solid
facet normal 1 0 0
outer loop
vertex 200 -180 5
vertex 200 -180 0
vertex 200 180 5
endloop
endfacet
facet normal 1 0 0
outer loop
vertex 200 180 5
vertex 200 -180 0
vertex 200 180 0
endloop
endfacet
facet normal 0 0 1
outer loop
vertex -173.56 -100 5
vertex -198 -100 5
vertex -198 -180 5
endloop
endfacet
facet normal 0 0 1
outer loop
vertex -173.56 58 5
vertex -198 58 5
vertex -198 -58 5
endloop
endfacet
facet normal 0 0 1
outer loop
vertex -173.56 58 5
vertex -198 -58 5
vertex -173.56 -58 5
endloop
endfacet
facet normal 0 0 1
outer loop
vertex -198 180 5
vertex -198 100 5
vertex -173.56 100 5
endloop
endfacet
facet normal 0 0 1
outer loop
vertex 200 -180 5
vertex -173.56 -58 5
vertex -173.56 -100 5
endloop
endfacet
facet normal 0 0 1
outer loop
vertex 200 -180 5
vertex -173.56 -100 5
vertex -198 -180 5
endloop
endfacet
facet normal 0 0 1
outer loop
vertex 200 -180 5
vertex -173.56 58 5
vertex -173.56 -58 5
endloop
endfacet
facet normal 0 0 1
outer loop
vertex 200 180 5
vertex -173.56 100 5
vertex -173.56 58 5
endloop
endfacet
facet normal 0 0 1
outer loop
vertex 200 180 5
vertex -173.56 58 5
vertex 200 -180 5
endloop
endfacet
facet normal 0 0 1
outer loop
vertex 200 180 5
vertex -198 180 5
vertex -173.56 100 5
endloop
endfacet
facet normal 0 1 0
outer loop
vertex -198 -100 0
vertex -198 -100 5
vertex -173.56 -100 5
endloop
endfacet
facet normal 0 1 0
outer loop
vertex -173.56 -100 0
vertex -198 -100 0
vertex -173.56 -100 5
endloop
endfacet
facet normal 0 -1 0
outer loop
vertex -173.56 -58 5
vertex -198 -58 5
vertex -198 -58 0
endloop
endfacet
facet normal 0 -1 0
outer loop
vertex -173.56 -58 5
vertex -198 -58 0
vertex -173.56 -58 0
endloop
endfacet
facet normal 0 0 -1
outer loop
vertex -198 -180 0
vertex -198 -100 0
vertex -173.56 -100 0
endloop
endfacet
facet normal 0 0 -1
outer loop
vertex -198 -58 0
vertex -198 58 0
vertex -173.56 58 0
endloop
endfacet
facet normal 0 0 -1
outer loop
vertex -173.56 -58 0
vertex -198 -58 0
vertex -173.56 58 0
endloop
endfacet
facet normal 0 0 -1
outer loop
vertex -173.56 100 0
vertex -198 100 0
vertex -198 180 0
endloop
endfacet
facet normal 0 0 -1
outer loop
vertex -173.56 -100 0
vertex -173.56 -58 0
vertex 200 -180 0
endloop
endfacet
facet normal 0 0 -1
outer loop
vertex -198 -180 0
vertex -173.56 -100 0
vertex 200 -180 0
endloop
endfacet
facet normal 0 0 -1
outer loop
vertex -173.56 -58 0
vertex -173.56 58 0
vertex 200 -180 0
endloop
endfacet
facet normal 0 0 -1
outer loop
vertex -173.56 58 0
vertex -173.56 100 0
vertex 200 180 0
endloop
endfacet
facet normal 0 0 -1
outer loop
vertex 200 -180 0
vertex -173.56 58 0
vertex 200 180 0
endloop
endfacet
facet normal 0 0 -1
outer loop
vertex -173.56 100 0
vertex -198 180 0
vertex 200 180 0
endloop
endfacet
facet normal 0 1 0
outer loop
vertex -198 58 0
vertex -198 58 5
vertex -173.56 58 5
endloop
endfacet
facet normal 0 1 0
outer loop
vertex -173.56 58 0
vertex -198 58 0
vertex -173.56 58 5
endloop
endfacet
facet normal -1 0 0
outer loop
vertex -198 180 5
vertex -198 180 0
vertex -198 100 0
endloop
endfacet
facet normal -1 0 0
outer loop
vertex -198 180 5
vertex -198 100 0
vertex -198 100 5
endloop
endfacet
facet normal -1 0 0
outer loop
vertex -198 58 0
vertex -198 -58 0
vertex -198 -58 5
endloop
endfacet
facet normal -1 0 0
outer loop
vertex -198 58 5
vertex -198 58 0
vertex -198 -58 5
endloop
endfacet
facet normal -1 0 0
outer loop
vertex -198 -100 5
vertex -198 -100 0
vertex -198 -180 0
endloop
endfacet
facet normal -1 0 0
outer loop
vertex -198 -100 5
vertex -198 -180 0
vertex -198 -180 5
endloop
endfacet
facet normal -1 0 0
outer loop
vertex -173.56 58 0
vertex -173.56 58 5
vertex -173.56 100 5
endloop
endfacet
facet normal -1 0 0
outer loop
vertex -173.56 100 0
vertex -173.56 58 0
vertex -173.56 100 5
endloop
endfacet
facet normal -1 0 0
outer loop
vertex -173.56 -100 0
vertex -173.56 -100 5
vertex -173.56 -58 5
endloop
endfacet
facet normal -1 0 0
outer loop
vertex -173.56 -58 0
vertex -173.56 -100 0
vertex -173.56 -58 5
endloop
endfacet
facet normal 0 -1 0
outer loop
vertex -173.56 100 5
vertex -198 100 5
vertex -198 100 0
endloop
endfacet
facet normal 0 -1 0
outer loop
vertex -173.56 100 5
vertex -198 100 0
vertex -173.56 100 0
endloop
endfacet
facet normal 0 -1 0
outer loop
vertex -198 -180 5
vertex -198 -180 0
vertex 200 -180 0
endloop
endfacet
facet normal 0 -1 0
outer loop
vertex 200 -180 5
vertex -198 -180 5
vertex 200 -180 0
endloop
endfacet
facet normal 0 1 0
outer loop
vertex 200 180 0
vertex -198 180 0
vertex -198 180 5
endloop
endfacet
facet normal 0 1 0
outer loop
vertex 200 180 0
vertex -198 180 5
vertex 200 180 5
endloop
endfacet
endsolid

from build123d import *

# Parameters (mm, degrees)
ESQUISSE1_W             = 400
ESQUISSE1_H             = 360
BOSS_EXTRU_1_DEPTH      = 5
ESQUISSE2_W             = 26.439561959
ESQUISSE2_H             = 42
ENL_V_MAT_EXTRU_1_DEPTH = 5
ESQUISSE3_W             = 5
ESQUISSE3_H             = 116
ESQUISSE3_H_2           = 80
ENL_V_MAT_EXTRU_2_DEPTH = 2


with BuildPart() as part:
    # Esquisse1 → Boss.-Extru.1 (new body)
    with BuildSketch(Plane.XY):
        Rectangle(ESQUISSE1_W, ESQUISSE1_H)
    extrude(amount=BOSS_EXTRU_1_DEPTH)

    # Esquisse2 → Enlèv. mat.-Extru.1 (cut)
    with BuildSketch(Plane.XY.offset(5)):
        with Locations((-186.78021902, 79)):
            Rectangle(ESQUISSE2_W, ESQUISSE2_H)
        with Locations((-186.78021902, -79)):
            Rectangle(ESQUISSE2_W, ESQUISSE2_H)
    extrude(amount=-ENL_V_MAT_EXTRU_1_DEPTH, mode=Mode.SUBTRACT)

    # Esquisse3 → Enlèv. mat.-Extru.2 (cut)
    with BuildSketch(Plane.ZY.offset(200)):
        with Locations((2.5, 0)):
            Rectangle(ESQUISSE3_W, ESQUISSE3_H)
        with Locations((2.5, 140)):
            Rectangle(ESQUISSE3_W, ESQUISSE3_H_2)
        with Locations((2.5, -140)):
            Rectangle(ESQUISSE3_W, ESQUISSE3_H_2)
    extrude(amount=-ENL_V_MAT_EXTRU_2_DEPTH, mode=Mode.SUBTRACT)


solid = part.part
